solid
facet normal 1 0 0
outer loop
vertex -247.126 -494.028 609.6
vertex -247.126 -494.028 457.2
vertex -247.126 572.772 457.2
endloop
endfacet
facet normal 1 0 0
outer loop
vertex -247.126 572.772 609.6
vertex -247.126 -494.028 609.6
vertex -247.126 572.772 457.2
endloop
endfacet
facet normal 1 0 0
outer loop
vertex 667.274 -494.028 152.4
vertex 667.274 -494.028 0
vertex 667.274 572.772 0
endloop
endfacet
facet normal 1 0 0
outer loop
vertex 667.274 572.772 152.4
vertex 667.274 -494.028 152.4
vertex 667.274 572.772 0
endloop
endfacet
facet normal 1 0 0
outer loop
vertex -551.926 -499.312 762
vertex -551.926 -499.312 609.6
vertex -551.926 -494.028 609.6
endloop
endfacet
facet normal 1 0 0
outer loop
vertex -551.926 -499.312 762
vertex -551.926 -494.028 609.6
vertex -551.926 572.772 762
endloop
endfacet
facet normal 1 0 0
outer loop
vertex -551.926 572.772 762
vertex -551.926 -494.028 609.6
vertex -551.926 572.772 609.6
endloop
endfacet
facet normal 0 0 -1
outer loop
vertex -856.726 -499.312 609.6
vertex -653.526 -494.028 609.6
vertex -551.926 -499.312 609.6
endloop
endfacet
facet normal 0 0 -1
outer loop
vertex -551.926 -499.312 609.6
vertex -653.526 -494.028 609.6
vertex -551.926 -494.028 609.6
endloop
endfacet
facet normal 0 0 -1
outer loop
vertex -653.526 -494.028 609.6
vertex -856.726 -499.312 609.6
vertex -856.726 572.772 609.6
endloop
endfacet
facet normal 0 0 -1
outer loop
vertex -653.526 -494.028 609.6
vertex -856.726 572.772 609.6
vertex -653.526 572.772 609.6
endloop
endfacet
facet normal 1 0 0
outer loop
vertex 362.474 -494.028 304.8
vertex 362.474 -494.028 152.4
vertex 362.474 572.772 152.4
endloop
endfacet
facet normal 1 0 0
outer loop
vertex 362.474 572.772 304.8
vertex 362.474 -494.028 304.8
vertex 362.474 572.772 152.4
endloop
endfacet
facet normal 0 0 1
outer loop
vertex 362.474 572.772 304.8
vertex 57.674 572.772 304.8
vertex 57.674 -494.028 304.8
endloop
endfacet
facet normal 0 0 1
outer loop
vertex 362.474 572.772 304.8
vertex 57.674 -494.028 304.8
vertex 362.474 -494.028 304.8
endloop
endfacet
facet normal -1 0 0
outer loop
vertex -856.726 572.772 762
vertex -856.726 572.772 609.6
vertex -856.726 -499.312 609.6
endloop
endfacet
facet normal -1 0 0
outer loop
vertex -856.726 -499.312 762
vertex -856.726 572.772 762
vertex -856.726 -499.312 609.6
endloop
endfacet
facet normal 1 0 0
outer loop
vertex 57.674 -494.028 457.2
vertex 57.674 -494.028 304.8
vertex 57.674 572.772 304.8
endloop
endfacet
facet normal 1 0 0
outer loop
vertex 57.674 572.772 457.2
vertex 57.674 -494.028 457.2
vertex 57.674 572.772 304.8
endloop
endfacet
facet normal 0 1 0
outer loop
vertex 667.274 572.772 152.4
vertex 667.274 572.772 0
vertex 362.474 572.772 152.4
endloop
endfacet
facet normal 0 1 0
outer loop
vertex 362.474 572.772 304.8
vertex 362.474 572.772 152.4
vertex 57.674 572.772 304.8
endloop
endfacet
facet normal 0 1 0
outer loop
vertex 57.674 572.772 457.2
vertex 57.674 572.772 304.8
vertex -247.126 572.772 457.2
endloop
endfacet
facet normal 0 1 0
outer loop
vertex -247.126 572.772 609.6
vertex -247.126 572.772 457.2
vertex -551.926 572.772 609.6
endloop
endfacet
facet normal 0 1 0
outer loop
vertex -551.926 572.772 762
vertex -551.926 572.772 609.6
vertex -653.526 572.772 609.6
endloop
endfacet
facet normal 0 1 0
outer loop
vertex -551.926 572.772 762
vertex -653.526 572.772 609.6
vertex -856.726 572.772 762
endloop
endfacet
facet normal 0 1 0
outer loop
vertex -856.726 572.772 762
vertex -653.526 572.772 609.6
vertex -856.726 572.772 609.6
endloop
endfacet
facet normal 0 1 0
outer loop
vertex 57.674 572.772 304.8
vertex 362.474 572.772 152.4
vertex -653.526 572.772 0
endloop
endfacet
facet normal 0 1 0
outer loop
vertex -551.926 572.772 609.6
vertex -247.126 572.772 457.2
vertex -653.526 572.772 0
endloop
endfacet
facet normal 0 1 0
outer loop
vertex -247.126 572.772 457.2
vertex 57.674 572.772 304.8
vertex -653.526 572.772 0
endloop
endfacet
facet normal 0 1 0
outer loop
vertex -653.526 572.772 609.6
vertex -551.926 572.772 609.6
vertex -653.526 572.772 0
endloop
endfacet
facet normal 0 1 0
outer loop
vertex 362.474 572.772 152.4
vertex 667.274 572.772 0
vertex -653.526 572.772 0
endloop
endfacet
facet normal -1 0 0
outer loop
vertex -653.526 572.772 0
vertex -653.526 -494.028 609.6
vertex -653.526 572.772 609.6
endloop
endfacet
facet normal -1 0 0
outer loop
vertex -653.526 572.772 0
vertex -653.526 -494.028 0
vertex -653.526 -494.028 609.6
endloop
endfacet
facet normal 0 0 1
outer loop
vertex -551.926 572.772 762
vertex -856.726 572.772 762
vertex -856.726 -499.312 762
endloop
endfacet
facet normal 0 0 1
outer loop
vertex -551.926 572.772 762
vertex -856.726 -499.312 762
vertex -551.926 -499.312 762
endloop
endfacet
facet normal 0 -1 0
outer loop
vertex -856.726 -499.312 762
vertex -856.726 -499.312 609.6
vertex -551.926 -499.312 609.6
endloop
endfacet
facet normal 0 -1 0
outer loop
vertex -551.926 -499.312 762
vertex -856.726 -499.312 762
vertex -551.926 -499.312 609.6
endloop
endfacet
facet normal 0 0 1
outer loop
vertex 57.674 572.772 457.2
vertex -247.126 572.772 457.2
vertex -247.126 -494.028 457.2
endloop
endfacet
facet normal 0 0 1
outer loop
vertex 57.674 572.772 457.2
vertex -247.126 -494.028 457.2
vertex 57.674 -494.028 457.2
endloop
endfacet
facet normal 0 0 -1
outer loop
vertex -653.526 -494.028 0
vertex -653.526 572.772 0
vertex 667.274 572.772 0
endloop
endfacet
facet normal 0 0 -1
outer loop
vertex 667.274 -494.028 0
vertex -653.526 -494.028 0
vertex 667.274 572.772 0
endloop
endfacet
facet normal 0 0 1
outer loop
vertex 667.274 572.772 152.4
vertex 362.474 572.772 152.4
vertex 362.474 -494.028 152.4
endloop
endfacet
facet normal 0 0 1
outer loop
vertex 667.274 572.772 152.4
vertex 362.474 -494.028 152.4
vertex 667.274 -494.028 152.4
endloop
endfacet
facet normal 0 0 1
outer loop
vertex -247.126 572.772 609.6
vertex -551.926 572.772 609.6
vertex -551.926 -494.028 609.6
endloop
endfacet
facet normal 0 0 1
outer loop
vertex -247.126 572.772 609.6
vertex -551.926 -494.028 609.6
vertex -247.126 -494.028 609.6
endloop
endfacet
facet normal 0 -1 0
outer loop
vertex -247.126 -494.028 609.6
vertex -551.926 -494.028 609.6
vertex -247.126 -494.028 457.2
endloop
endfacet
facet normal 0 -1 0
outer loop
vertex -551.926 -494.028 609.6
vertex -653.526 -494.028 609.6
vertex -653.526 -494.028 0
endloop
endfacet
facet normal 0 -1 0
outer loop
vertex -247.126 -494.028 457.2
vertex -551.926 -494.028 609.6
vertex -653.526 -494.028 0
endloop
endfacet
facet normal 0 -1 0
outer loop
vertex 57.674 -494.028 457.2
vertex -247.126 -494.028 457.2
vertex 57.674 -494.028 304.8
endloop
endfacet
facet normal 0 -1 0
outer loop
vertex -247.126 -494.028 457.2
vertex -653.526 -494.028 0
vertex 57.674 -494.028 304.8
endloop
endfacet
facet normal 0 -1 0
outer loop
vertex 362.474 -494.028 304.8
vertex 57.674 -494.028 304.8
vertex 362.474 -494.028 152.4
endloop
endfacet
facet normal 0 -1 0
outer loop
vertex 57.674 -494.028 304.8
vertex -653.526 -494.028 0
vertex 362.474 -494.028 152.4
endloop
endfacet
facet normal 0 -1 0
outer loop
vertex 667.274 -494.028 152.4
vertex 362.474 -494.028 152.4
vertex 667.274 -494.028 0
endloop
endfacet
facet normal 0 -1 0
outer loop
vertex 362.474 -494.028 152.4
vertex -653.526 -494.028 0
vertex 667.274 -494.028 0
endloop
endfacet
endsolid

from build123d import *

# Parameters (mm, degrees)
F0_W     = 1320.8
F0_H     = 1066.8
F1_DEPTH = 152.4
F2_W     = 1016
F2_H     = 1066.8
F3_DEPTH = 152.4
F4_W     = 711.2
F4_H     = 1066.8
F5_DEPTH = 152.4
F6_W     = 406.4
F6_H     = 1066.8
F7_DEPTH = 152.4
F9_DEPTH = 152.4


with BuildPart() as f1:
    # F0 (on Top) → F1 (new body)
    with BuildSketch(Plane.XY):
        with Locations((6.8740844727, 39.3722309107)):
            Rectangle(F0_W, F0_H)
    extrude(amount=F1_DEPTH)

    # F2 (on face) → F3 (join)
    with BuildSketch(Plane.XY.offset(152.4)):
        with Locations((-145.5259155273, 39.3722309107)):
            Rectangle(F2_W, F2_H)
    extrude(amount=F3_DEPTH)

    # F4 (on face) → F5 (join)
    with BuildSketch(Plane.XY.offset(304.8)):
        with Locations((-297.9259155273, 39.3722309107)):
            Rectangle(F4_W, F4_H)
    extrude(amount=F5_DEPTH)

    # F6 (on face) → F7 (join)
    with BuildSketch(Plane.XY.offset(457.2)):
        with Locations((-450.3259155273, 39.3722309107)):
            Rectangle(F6_W, F6_H)
    extrude(amount=F7_DEPTH)

    # F8 (on face) → F9 (join)
    with BuildSketch(Plane.XY.offset(609.6)):
        Polygon((-551.9259155273, -499.3119239807), (-551.9259155273, 572.7722309107), (-653.5259155273, 572.7722309107), (-856.7259155273, 572.7722309107), (-856.7259155273, -499.3119239807), align=None)
    extrude(amount=F9_DEPTH)


solid = f1.part
